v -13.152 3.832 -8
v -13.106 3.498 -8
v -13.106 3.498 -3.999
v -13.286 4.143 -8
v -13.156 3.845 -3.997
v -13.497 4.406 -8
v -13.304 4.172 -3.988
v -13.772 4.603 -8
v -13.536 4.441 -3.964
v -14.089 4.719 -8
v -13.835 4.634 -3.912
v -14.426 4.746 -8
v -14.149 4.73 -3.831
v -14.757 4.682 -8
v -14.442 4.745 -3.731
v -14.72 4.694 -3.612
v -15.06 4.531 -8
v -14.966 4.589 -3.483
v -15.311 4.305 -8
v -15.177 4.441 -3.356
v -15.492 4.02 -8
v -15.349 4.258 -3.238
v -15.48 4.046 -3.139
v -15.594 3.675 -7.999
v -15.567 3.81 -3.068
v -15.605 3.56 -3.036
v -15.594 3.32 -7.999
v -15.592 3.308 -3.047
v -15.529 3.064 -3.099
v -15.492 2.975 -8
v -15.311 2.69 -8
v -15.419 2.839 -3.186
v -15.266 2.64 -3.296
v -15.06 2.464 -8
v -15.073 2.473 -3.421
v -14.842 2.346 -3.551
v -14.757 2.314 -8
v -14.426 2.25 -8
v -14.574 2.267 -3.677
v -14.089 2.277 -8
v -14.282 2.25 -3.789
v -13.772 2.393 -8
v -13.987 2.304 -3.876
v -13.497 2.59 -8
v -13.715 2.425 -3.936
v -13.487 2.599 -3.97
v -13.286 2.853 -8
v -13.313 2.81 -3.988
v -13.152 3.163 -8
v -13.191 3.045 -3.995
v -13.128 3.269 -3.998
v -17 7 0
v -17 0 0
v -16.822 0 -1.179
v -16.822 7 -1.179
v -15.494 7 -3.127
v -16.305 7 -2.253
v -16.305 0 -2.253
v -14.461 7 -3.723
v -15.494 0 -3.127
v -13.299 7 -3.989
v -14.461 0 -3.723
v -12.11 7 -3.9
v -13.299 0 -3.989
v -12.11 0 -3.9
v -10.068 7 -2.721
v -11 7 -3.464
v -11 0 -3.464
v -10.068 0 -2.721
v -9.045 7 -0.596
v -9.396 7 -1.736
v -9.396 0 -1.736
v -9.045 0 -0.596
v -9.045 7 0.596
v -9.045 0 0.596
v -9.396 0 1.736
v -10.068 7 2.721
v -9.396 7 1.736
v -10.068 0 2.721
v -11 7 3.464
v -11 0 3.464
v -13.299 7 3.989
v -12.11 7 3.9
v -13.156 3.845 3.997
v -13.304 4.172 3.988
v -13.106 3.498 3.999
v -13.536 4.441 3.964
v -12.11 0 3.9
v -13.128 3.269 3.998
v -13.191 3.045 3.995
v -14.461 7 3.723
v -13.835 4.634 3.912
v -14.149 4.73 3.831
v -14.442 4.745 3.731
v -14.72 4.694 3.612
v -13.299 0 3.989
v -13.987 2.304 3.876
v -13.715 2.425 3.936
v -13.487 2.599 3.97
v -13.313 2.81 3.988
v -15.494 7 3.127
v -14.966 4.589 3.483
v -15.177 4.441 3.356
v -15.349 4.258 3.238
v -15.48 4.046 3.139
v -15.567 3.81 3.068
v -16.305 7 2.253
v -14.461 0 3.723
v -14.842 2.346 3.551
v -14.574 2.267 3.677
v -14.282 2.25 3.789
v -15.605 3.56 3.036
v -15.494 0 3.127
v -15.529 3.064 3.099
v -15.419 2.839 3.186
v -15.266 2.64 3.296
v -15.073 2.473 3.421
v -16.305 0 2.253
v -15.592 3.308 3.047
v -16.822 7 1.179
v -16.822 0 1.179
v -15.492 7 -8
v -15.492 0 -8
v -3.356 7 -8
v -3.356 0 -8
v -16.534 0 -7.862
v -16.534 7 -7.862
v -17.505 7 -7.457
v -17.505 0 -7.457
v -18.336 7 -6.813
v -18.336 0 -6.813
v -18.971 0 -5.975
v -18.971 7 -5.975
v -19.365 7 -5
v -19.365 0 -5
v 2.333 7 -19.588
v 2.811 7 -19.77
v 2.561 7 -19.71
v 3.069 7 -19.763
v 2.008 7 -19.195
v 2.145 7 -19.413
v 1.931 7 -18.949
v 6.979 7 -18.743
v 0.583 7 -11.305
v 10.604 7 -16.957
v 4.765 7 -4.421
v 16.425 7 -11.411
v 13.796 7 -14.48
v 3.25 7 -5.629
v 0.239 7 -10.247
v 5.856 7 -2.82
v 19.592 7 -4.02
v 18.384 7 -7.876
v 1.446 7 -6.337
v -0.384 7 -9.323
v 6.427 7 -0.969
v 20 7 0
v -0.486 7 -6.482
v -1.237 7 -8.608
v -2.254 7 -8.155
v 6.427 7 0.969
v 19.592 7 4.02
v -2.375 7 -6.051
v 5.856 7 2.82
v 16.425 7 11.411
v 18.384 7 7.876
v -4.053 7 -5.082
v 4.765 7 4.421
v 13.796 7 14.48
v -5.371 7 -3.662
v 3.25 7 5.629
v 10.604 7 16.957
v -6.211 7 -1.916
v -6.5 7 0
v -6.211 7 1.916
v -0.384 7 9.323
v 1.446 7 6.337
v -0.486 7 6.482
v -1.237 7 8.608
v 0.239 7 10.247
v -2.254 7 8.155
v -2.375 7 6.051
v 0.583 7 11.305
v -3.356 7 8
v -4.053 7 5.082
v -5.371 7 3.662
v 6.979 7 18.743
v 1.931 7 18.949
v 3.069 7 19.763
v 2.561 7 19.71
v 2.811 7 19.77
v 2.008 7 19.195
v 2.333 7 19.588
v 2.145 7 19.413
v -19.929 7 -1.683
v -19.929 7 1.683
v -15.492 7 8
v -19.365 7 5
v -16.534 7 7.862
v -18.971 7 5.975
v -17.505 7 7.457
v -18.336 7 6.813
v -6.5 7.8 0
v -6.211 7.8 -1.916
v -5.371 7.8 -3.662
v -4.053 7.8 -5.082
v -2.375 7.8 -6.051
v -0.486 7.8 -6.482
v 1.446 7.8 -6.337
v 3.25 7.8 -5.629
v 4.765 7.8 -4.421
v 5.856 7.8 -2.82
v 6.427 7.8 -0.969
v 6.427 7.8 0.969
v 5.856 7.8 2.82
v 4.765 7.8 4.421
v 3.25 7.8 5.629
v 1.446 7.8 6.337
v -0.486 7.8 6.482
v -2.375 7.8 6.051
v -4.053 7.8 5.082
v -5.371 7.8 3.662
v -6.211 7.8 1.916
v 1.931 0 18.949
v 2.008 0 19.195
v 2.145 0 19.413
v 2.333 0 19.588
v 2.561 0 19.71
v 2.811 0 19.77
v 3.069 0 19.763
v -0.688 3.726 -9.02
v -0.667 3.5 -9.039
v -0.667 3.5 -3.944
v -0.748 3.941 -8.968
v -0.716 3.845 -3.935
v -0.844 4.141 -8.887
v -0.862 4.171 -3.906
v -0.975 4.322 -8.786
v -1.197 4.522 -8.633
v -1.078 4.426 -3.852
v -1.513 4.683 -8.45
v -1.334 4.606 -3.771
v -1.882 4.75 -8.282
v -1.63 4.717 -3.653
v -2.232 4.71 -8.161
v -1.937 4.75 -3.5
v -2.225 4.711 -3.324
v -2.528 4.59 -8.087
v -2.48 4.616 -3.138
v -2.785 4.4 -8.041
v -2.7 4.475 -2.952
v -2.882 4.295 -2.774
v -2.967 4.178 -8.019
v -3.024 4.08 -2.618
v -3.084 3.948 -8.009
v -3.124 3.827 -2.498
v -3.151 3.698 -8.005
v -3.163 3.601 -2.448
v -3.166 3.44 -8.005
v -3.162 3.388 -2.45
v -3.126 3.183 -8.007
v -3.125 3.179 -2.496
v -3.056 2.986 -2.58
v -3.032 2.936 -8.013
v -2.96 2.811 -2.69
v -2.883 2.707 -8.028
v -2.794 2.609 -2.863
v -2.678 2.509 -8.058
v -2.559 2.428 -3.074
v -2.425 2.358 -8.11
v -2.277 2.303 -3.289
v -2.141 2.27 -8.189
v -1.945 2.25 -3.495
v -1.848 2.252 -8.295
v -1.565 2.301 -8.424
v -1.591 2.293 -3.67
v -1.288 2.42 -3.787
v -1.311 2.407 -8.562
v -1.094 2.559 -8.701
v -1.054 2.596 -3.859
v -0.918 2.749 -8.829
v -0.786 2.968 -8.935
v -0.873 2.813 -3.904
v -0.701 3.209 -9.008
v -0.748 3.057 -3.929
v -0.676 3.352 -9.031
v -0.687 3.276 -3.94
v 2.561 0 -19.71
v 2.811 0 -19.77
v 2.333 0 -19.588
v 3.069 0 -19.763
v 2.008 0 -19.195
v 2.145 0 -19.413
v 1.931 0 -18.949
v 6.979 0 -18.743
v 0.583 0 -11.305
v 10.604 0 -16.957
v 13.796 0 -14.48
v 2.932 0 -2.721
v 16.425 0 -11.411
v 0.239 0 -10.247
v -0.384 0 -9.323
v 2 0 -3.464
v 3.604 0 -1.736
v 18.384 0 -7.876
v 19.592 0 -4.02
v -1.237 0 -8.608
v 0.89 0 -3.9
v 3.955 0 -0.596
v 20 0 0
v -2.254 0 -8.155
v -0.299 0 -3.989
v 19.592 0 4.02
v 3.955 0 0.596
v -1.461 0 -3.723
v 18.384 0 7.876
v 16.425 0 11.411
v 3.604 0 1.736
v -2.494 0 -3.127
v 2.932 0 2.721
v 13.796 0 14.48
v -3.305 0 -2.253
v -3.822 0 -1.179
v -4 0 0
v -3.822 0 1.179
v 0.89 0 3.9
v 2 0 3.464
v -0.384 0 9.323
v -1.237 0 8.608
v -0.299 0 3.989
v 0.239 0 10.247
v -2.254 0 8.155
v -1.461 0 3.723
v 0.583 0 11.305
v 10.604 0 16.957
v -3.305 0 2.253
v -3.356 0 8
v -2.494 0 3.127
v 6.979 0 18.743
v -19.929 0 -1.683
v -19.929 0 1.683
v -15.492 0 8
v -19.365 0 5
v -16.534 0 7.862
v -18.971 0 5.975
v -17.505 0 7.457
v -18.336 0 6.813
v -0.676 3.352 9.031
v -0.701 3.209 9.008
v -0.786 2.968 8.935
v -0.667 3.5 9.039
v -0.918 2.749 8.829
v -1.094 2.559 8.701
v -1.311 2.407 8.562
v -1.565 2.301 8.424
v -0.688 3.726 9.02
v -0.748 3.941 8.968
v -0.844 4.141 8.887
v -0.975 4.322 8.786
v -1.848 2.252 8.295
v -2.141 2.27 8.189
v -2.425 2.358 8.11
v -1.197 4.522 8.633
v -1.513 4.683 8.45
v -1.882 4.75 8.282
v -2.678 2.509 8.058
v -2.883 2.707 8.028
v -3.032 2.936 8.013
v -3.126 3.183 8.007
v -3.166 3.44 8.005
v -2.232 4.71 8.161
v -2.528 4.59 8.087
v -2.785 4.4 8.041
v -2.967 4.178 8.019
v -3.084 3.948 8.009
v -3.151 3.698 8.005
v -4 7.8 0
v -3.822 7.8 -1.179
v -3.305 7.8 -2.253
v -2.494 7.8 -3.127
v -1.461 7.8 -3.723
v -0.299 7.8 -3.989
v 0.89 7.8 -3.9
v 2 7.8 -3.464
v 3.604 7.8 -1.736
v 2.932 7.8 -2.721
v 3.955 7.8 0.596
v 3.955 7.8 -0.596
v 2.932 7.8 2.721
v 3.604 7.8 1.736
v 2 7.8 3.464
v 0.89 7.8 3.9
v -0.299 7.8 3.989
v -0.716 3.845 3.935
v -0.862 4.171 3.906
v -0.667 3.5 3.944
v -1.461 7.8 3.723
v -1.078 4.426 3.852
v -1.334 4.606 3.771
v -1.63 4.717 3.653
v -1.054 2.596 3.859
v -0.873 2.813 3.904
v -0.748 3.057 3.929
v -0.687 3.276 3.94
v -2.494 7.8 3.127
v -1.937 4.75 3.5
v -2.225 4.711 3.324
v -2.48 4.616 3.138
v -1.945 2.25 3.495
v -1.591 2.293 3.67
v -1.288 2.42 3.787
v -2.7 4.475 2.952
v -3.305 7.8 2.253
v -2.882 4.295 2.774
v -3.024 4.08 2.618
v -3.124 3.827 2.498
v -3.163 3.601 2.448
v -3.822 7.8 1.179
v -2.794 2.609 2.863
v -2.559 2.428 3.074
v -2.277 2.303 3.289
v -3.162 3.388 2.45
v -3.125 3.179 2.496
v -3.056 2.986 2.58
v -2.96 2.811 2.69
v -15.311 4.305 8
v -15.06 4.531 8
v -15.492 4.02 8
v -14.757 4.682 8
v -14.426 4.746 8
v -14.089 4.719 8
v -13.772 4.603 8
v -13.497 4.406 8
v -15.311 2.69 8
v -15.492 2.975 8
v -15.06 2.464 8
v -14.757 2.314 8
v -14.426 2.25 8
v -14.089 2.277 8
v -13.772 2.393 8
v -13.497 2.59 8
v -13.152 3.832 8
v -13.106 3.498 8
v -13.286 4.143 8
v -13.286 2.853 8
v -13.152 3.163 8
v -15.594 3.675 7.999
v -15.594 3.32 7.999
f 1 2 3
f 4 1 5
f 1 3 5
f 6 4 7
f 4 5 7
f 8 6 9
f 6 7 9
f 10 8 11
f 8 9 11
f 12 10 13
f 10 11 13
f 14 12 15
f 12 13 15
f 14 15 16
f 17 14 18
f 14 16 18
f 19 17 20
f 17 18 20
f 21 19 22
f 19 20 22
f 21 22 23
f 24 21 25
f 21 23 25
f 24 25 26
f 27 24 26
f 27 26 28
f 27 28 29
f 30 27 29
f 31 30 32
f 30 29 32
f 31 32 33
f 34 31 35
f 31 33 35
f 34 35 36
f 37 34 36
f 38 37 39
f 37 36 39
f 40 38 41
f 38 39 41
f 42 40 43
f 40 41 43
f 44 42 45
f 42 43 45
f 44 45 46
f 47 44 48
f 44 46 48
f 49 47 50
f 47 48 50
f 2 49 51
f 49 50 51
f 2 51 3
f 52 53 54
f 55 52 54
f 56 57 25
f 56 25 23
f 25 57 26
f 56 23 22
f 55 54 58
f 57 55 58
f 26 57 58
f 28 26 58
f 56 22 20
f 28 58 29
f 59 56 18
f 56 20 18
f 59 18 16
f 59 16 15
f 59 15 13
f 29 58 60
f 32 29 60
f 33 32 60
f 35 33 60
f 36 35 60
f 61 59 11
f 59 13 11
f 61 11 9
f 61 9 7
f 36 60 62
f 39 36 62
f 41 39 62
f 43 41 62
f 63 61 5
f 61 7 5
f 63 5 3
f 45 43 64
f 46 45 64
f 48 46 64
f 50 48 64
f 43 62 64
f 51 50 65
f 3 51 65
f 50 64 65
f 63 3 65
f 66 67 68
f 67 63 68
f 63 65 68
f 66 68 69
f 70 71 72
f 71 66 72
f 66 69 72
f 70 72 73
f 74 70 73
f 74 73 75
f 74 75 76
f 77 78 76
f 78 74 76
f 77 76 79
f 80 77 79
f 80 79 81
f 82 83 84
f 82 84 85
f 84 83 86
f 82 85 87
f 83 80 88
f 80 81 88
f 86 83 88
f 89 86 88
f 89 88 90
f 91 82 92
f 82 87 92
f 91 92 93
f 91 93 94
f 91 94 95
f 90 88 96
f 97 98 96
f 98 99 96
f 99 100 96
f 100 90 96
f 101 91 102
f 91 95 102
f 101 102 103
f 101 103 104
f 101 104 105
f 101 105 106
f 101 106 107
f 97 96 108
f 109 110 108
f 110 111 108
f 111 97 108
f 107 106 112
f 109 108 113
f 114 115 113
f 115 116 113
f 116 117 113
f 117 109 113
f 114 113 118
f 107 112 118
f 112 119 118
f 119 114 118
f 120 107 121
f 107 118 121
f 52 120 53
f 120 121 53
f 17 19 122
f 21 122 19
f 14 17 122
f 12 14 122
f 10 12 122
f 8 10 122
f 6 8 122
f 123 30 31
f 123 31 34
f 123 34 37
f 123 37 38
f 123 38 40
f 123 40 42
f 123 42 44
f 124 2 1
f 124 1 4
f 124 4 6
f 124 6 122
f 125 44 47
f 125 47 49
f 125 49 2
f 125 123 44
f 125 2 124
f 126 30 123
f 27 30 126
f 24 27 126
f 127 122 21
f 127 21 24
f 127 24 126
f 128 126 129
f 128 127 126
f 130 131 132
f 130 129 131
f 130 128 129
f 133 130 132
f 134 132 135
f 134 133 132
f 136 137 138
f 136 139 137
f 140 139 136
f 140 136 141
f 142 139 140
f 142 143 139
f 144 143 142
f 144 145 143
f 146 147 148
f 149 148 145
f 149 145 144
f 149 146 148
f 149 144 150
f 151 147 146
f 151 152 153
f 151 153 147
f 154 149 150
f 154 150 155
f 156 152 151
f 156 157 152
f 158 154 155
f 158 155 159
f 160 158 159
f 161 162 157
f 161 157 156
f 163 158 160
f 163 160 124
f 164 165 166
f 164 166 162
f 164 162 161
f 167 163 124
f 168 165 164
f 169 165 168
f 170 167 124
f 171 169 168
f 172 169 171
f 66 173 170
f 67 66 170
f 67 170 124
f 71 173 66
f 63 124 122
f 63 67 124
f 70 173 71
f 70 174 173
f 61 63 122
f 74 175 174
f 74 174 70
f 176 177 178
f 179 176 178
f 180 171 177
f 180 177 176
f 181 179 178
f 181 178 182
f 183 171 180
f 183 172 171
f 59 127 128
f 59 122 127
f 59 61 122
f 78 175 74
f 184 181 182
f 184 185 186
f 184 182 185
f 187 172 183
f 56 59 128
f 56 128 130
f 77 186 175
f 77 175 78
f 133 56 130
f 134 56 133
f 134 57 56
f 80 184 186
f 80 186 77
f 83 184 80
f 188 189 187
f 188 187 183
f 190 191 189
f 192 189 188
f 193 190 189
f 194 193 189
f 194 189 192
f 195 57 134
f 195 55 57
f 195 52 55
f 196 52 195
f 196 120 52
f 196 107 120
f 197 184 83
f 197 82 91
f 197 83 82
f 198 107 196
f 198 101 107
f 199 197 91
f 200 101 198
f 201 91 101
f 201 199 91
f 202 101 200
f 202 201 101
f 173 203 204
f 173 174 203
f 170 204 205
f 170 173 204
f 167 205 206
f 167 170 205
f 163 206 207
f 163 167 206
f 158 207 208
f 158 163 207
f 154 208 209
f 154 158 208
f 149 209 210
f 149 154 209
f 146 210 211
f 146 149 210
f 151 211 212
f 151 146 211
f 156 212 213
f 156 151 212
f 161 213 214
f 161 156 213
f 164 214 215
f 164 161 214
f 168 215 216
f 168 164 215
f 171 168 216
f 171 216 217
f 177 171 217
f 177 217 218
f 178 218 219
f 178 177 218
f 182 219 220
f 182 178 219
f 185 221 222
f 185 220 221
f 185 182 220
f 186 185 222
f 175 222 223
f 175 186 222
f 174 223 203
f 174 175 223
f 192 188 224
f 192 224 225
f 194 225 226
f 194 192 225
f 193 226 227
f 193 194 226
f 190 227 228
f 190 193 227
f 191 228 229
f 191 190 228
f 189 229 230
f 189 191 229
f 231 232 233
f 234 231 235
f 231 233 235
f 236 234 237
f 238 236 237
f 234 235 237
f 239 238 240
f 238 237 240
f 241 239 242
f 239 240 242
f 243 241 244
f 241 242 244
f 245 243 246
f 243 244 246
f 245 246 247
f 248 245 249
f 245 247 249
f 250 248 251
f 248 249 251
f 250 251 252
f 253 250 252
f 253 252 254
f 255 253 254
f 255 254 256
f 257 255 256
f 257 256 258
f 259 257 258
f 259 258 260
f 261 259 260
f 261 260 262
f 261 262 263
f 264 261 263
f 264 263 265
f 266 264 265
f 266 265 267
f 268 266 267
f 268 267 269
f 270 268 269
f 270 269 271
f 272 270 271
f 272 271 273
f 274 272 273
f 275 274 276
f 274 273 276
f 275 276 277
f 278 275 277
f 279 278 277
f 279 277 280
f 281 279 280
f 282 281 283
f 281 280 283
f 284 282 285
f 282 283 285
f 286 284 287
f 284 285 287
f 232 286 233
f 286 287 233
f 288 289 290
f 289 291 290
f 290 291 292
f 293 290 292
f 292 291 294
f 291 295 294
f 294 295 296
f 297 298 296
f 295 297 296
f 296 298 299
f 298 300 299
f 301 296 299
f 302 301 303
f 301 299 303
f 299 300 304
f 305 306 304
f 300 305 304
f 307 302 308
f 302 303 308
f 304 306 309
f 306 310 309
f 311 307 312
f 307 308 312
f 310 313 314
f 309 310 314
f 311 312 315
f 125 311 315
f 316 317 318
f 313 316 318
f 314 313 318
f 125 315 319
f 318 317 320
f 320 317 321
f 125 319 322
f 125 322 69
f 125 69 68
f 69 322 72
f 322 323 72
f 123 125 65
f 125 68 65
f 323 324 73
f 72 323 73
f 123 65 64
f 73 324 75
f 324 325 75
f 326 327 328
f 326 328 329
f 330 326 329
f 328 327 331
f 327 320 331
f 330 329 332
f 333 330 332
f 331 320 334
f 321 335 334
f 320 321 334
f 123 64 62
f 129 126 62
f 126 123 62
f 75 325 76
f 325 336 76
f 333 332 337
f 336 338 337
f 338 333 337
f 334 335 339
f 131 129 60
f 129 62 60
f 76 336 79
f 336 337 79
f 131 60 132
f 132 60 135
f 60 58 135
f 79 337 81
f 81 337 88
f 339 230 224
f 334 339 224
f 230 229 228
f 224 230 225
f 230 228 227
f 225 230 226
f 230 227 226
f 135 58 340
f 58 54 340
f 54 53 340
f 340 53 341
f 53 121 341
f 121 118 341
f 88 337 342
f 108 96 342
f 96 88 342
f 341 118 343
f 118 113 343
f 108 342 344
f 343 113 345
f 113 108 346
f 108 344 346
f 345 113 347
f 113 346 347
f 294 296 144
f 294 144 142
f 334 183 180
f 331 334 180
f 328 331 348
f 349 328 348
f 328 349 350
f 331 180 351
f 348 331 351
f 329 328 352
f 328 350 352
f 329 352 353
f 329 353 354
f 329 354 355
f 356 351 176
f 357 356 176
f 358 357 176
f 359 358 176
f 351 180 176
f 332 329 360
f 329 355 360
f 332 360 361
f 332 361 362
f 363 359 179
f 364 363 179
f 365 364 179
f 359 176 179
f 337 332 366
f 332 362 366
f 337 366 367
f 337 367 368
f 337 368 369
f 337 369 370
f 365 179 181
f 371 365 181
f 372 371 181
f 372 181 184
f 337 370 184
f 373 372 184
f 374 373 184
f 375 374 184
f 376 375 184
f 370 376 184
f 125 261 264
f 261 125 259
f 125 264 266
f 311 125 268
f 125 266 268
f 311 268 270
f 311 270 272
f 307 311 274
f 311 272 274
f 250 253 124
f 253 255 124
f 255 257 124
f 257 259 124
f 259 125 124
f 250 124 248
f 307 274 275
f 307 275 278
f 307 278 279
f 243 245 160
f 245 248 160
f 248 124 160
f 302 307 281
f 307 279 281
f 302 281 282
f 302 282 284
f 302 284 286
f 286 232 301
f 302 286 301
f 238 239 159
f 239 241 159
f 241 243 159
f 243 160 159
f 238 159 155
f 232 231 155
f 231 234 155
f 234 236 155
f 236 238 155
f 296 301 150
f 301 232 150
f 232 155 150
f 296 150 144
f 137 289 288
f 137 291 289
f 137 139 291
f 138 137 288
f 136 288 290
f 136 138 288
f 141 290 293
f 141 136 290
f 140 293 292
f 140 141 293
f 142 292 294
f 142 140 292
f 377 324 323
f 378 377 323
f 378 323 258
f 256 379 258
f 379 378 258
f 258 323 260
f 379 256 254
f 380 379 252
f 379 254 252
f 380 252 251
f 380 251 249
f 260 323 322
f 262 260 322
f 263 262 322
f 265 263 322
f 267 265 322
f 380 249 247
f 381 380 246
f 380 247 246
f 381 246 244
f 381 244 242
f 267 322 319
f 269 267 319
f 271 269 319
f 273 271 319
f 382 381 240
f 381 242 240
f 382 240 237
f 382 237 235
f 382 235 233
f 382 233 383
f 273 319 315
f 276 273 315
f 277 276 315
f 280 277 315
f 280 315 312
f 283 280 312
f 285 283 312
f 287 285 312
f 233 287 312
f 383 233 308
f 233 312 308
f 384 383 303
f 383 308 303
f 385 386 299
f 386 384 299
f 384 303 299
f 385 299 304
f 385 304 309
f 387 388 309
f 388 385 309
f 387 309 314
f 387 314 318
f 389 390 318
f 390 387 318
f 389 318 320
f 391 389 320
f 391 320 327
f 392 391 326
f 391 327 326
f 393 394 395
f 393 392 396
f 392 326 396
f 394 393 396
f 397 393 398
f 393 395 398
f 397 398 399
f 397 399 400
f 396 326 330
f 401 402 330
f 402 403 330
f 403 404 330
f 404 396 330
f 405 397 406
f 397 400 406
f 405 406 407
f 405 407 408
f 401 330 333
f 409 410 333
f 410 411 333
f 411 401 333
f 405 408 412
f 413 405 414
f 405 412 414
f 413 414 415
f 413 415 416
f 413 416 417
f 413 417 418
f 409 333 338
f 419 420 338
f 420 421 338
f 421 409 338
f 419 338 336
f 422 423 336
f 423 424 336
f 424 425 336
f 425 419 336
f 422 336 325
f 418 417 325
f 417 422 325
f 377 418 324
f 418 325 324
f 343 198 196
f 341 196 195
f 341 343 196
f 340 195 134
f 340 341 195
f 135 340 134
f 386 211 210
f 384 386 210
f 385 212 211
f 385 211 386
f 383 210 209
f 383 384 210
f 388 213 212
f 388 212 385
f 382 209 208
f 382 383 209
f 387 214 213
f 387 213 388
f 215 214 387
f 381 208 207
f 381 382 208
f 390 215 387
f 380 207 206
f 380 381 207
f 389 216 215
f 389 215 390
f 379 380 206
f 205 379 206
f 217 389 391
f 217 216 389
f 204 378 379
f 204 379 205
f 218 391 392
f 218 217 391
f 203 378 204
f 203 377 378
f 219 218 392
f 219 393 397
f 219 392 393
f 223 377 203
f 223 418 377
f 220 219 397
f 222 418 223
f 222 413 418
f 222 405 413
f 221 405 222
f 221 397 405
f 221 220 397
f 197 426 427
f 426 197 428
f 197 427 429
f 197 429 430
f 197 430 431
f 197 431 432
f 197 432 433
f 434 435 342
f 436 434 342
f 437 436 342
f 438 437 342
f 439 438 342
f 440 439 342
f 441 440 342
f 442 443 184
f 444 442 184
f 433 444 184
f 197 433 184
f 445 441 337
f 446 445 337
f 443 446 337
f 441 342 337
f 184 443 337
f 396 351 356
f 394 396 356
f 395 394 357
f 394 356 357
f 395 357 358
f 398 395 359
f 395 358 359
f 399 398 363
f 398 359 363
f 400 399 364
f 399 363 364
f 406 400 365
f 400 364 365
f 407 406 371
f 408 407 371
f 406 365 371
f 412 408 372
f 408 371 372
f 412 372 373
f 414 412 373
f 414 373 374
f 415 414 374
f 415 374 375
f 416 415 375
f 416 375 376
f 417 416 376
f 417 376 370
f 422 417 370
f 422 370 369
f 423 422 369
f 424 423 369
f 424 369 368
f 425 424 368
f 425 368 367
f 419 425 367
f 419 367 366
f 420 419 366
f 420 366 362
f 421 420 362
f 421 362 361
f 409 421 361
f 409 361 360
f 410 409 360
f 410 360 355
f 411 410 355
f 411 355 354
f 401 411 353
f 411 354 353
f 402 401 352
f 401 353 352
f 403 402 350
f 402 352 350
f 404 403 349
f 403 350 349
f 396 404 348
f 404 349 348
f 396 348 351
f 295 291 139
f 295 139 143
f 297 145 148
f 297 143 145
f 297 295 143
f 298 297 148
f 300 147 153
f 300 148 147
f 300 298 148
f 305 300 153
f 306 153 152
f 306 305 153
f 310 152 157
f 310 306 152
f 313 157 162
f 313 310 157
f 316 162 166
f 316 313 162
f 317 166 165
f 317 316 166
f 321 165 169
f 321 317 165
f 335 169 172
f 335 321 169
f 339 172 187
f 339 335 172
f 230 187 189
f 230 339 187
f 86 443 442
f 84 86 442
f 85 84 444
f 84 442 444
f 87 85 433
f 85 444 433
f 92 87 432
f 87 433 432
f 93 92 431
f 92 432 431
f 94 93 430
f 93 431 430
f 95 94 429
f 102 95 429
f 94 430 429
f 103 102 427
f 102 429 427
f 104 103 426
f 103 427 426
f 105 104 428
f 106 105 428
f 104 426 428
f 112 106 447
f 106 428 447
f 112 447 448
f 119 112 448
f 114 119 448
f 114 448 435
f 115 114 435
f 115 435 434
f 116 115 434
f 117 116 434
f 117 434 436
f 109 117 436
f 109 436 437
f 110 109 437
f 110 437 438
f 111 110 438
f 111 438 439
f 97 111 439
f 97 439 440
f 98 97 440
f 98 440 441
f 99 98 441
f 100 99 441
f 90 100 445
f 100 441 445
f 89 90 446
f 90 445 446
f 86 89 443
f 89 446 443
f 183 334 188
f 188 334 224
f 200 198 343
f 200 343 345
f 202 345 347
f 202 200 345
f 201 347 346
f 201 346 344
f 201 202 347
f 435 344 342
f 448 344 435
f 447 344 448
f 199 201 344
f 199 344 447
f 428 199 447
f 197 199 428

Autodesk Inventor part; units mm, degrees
ref_plane "XZ Plane" through (0, 0, 0) normal (0, 1, 0) x (-1, 0, 0)
sketch "Sketch1" plane through (0, 0, 0) normal (0, 1, 0) x (-1, 0, 0)
  line L0 (20, 0) -> (20, -8) construction
  line L1 (20, -8) -> (20, 8)
  line L2 (20, 8) -> (0, 8)
  line L3 (20, -8) -> (0, -8)
  line L4 (0, -8) -> (-2.0965, -19.8898)
  line L5 (0, 8) -> (-2.0965, 19.8898)
  arc A0 (-2.0965, 19.8898) -> (-2.0965, -19.8898) centre (0, 0) ccw construction
  arc A1 (18.3303, -8) -> (18.3303, 8) centre (0, 0) ccw construction
  arc A2 (-2.0965, 19.8898) -> (-2.0965, -19.8898) centre (0, 0) ccw
  arc A3 (18.3303, -8) -> (18.3303, 8) centre (0, 0) ccw
  circle A4 centre (0, 0) radius 20 construction
  circle A5 centre (13, 0) radius 4
  circle A6 centre (0, 0) radius 4
  circle A7 centre (0, 0) radius 6.5
  dimension "d1" = 8
  dimension "d2" = 16
  dimension "d3" = 20
  dimension "d4" = 20
  dimension "d5" = 100
  dimension "d6" = 100
  dimension "d7" = 40
  dimension "d8" = 20
  dimension "d10" = 8
  dimension "d14" = 8
  dimension "d15" = 13
  dimension "d16" = 13
  dimension "d21" = 7
extrude "Extrusion4" add sketch "Sketch1" along normal blind 7 contours A3 L3 L4 A2 L5 L2
extrude "Extrusion5" add sketch "Sketch1" along normal blind 7.8 contours A7
fillet "Fillet1" radius 4 1 edges at (-18.3303, 3.5, 8)
fillet "Fillet2" radius 4 1 edges at (-18.3303, 3.5, -8)
fillet "Fillet3" radius 4 2 edges at (0, 3.5, -8) (0, 3.5, 8)
fillet "Fillet4" radius 1 2 edges at (2.0965, 3.5, 19.8898) (2.0965, 3.5, -19.8898)
ref_plane "Work Plane1" through (0, 0, 0) normal (0, -1, 0) x (1, 0, 0)
sketch "Sketch3" plane through (-15.4919, 0, 8) normal (0, 0, 1) x (1, 0, 0)
  line L0 (6.4919, 0) -> (-1.5081, 0) projected
  line L1 (0, 7) -> (12.1355, 7) projected
  line L2 (-3.873, 7) -> (0, 7) projected
  line L3 (0, 0) -> (-3.873, 0) projected
  line L4 (-1.5081, 7) -> (6.4919, 7) projected
  line L5 (6.4919, 0) -> (-1.5081, 0) projected
  line L6 (19.4919, 0) -> (11.4919, 0) projected
  line L7 (6.4919, 0) -> (-1.5081, 0) projected
  line L8 (18.5607, 0) -> (17.4225, 0) projected
  line L9 (18.5607, 0) -> (18.5607, 0) projected
  line L10 (17.4225, 0) -> (18.5607, 0) projected
  line L11 (16.0748, 0) -> (17.4225, 0) projected
  line L12 (12.1355, 0) -> (16.0748, 0) projected
  line L13 (0, 0) -> (12.1355, 0) projected
  line L14 (-3.873, 0) -> (0, 0) projected
  line L15 (-3.873, 0) -> (-3.873, 0) projected
  line L16 (0, 0) -> (-3.873, 0) projected
  line L17 (12.1355, 0) -> (0, 0) projected
  line L18 (16.0748, 0) -> (12.1355, 0) projected
  line L19 (17.4225, 0) -> (16.0748, 0) projected
  circle A0 centre (1.1355, 3.4977) radius 1.25
  line L20 (12.1355, 7) -> (12.1355, 0) projected
  point P0 (15.4919, 0)
  dimension "d33" = 2.5
  dimension "d34" = 11
  dimension "d35" = 3.4977
extrude "Extrusion6" cut sketch "Sketch3" against normal through all
ref_plane "Work Plane2" through (0, 0, 11.5) normal (0, 0, 1) x (1, 0, 0)
sketch "Sketch5" plane through (0, 0, 11.5) normal (0, 0, 1) x (1, 0, 0)
  line L0 (0.5828, 0) -> (0.5828, 7) projected
  line L1 (0.5828, 0) -> (1.9305, 0) construction
  line L2 (0.5828, 0) -> (-4.4172, 0) construction
  line L3 (-4.4172, 0) -> (-4.4172, 7) construction
  line L4 (-4.4172, 7) -> (0.5828, 7) construction
  line L5 (-4.4172, 0) -> (-4.4172, 3.5) construction
  line L6 (-4.4172, 7) -> (-1.9172, 7) construction
  circle A0 centre (-1.9172, 3.5) radius 1.25
  point P0 (0, 0)
  dimension "d45" = 5
  dimension "d46" = 7
  dimension "d47" = 5
  dimension "d48" = 3.5
  dimension "d50" = 2.5
extrude "Extrusion7" cut sketch "Sketch5" against normal through all
properties part number "reverse gear crankshaft counter weight 2"
